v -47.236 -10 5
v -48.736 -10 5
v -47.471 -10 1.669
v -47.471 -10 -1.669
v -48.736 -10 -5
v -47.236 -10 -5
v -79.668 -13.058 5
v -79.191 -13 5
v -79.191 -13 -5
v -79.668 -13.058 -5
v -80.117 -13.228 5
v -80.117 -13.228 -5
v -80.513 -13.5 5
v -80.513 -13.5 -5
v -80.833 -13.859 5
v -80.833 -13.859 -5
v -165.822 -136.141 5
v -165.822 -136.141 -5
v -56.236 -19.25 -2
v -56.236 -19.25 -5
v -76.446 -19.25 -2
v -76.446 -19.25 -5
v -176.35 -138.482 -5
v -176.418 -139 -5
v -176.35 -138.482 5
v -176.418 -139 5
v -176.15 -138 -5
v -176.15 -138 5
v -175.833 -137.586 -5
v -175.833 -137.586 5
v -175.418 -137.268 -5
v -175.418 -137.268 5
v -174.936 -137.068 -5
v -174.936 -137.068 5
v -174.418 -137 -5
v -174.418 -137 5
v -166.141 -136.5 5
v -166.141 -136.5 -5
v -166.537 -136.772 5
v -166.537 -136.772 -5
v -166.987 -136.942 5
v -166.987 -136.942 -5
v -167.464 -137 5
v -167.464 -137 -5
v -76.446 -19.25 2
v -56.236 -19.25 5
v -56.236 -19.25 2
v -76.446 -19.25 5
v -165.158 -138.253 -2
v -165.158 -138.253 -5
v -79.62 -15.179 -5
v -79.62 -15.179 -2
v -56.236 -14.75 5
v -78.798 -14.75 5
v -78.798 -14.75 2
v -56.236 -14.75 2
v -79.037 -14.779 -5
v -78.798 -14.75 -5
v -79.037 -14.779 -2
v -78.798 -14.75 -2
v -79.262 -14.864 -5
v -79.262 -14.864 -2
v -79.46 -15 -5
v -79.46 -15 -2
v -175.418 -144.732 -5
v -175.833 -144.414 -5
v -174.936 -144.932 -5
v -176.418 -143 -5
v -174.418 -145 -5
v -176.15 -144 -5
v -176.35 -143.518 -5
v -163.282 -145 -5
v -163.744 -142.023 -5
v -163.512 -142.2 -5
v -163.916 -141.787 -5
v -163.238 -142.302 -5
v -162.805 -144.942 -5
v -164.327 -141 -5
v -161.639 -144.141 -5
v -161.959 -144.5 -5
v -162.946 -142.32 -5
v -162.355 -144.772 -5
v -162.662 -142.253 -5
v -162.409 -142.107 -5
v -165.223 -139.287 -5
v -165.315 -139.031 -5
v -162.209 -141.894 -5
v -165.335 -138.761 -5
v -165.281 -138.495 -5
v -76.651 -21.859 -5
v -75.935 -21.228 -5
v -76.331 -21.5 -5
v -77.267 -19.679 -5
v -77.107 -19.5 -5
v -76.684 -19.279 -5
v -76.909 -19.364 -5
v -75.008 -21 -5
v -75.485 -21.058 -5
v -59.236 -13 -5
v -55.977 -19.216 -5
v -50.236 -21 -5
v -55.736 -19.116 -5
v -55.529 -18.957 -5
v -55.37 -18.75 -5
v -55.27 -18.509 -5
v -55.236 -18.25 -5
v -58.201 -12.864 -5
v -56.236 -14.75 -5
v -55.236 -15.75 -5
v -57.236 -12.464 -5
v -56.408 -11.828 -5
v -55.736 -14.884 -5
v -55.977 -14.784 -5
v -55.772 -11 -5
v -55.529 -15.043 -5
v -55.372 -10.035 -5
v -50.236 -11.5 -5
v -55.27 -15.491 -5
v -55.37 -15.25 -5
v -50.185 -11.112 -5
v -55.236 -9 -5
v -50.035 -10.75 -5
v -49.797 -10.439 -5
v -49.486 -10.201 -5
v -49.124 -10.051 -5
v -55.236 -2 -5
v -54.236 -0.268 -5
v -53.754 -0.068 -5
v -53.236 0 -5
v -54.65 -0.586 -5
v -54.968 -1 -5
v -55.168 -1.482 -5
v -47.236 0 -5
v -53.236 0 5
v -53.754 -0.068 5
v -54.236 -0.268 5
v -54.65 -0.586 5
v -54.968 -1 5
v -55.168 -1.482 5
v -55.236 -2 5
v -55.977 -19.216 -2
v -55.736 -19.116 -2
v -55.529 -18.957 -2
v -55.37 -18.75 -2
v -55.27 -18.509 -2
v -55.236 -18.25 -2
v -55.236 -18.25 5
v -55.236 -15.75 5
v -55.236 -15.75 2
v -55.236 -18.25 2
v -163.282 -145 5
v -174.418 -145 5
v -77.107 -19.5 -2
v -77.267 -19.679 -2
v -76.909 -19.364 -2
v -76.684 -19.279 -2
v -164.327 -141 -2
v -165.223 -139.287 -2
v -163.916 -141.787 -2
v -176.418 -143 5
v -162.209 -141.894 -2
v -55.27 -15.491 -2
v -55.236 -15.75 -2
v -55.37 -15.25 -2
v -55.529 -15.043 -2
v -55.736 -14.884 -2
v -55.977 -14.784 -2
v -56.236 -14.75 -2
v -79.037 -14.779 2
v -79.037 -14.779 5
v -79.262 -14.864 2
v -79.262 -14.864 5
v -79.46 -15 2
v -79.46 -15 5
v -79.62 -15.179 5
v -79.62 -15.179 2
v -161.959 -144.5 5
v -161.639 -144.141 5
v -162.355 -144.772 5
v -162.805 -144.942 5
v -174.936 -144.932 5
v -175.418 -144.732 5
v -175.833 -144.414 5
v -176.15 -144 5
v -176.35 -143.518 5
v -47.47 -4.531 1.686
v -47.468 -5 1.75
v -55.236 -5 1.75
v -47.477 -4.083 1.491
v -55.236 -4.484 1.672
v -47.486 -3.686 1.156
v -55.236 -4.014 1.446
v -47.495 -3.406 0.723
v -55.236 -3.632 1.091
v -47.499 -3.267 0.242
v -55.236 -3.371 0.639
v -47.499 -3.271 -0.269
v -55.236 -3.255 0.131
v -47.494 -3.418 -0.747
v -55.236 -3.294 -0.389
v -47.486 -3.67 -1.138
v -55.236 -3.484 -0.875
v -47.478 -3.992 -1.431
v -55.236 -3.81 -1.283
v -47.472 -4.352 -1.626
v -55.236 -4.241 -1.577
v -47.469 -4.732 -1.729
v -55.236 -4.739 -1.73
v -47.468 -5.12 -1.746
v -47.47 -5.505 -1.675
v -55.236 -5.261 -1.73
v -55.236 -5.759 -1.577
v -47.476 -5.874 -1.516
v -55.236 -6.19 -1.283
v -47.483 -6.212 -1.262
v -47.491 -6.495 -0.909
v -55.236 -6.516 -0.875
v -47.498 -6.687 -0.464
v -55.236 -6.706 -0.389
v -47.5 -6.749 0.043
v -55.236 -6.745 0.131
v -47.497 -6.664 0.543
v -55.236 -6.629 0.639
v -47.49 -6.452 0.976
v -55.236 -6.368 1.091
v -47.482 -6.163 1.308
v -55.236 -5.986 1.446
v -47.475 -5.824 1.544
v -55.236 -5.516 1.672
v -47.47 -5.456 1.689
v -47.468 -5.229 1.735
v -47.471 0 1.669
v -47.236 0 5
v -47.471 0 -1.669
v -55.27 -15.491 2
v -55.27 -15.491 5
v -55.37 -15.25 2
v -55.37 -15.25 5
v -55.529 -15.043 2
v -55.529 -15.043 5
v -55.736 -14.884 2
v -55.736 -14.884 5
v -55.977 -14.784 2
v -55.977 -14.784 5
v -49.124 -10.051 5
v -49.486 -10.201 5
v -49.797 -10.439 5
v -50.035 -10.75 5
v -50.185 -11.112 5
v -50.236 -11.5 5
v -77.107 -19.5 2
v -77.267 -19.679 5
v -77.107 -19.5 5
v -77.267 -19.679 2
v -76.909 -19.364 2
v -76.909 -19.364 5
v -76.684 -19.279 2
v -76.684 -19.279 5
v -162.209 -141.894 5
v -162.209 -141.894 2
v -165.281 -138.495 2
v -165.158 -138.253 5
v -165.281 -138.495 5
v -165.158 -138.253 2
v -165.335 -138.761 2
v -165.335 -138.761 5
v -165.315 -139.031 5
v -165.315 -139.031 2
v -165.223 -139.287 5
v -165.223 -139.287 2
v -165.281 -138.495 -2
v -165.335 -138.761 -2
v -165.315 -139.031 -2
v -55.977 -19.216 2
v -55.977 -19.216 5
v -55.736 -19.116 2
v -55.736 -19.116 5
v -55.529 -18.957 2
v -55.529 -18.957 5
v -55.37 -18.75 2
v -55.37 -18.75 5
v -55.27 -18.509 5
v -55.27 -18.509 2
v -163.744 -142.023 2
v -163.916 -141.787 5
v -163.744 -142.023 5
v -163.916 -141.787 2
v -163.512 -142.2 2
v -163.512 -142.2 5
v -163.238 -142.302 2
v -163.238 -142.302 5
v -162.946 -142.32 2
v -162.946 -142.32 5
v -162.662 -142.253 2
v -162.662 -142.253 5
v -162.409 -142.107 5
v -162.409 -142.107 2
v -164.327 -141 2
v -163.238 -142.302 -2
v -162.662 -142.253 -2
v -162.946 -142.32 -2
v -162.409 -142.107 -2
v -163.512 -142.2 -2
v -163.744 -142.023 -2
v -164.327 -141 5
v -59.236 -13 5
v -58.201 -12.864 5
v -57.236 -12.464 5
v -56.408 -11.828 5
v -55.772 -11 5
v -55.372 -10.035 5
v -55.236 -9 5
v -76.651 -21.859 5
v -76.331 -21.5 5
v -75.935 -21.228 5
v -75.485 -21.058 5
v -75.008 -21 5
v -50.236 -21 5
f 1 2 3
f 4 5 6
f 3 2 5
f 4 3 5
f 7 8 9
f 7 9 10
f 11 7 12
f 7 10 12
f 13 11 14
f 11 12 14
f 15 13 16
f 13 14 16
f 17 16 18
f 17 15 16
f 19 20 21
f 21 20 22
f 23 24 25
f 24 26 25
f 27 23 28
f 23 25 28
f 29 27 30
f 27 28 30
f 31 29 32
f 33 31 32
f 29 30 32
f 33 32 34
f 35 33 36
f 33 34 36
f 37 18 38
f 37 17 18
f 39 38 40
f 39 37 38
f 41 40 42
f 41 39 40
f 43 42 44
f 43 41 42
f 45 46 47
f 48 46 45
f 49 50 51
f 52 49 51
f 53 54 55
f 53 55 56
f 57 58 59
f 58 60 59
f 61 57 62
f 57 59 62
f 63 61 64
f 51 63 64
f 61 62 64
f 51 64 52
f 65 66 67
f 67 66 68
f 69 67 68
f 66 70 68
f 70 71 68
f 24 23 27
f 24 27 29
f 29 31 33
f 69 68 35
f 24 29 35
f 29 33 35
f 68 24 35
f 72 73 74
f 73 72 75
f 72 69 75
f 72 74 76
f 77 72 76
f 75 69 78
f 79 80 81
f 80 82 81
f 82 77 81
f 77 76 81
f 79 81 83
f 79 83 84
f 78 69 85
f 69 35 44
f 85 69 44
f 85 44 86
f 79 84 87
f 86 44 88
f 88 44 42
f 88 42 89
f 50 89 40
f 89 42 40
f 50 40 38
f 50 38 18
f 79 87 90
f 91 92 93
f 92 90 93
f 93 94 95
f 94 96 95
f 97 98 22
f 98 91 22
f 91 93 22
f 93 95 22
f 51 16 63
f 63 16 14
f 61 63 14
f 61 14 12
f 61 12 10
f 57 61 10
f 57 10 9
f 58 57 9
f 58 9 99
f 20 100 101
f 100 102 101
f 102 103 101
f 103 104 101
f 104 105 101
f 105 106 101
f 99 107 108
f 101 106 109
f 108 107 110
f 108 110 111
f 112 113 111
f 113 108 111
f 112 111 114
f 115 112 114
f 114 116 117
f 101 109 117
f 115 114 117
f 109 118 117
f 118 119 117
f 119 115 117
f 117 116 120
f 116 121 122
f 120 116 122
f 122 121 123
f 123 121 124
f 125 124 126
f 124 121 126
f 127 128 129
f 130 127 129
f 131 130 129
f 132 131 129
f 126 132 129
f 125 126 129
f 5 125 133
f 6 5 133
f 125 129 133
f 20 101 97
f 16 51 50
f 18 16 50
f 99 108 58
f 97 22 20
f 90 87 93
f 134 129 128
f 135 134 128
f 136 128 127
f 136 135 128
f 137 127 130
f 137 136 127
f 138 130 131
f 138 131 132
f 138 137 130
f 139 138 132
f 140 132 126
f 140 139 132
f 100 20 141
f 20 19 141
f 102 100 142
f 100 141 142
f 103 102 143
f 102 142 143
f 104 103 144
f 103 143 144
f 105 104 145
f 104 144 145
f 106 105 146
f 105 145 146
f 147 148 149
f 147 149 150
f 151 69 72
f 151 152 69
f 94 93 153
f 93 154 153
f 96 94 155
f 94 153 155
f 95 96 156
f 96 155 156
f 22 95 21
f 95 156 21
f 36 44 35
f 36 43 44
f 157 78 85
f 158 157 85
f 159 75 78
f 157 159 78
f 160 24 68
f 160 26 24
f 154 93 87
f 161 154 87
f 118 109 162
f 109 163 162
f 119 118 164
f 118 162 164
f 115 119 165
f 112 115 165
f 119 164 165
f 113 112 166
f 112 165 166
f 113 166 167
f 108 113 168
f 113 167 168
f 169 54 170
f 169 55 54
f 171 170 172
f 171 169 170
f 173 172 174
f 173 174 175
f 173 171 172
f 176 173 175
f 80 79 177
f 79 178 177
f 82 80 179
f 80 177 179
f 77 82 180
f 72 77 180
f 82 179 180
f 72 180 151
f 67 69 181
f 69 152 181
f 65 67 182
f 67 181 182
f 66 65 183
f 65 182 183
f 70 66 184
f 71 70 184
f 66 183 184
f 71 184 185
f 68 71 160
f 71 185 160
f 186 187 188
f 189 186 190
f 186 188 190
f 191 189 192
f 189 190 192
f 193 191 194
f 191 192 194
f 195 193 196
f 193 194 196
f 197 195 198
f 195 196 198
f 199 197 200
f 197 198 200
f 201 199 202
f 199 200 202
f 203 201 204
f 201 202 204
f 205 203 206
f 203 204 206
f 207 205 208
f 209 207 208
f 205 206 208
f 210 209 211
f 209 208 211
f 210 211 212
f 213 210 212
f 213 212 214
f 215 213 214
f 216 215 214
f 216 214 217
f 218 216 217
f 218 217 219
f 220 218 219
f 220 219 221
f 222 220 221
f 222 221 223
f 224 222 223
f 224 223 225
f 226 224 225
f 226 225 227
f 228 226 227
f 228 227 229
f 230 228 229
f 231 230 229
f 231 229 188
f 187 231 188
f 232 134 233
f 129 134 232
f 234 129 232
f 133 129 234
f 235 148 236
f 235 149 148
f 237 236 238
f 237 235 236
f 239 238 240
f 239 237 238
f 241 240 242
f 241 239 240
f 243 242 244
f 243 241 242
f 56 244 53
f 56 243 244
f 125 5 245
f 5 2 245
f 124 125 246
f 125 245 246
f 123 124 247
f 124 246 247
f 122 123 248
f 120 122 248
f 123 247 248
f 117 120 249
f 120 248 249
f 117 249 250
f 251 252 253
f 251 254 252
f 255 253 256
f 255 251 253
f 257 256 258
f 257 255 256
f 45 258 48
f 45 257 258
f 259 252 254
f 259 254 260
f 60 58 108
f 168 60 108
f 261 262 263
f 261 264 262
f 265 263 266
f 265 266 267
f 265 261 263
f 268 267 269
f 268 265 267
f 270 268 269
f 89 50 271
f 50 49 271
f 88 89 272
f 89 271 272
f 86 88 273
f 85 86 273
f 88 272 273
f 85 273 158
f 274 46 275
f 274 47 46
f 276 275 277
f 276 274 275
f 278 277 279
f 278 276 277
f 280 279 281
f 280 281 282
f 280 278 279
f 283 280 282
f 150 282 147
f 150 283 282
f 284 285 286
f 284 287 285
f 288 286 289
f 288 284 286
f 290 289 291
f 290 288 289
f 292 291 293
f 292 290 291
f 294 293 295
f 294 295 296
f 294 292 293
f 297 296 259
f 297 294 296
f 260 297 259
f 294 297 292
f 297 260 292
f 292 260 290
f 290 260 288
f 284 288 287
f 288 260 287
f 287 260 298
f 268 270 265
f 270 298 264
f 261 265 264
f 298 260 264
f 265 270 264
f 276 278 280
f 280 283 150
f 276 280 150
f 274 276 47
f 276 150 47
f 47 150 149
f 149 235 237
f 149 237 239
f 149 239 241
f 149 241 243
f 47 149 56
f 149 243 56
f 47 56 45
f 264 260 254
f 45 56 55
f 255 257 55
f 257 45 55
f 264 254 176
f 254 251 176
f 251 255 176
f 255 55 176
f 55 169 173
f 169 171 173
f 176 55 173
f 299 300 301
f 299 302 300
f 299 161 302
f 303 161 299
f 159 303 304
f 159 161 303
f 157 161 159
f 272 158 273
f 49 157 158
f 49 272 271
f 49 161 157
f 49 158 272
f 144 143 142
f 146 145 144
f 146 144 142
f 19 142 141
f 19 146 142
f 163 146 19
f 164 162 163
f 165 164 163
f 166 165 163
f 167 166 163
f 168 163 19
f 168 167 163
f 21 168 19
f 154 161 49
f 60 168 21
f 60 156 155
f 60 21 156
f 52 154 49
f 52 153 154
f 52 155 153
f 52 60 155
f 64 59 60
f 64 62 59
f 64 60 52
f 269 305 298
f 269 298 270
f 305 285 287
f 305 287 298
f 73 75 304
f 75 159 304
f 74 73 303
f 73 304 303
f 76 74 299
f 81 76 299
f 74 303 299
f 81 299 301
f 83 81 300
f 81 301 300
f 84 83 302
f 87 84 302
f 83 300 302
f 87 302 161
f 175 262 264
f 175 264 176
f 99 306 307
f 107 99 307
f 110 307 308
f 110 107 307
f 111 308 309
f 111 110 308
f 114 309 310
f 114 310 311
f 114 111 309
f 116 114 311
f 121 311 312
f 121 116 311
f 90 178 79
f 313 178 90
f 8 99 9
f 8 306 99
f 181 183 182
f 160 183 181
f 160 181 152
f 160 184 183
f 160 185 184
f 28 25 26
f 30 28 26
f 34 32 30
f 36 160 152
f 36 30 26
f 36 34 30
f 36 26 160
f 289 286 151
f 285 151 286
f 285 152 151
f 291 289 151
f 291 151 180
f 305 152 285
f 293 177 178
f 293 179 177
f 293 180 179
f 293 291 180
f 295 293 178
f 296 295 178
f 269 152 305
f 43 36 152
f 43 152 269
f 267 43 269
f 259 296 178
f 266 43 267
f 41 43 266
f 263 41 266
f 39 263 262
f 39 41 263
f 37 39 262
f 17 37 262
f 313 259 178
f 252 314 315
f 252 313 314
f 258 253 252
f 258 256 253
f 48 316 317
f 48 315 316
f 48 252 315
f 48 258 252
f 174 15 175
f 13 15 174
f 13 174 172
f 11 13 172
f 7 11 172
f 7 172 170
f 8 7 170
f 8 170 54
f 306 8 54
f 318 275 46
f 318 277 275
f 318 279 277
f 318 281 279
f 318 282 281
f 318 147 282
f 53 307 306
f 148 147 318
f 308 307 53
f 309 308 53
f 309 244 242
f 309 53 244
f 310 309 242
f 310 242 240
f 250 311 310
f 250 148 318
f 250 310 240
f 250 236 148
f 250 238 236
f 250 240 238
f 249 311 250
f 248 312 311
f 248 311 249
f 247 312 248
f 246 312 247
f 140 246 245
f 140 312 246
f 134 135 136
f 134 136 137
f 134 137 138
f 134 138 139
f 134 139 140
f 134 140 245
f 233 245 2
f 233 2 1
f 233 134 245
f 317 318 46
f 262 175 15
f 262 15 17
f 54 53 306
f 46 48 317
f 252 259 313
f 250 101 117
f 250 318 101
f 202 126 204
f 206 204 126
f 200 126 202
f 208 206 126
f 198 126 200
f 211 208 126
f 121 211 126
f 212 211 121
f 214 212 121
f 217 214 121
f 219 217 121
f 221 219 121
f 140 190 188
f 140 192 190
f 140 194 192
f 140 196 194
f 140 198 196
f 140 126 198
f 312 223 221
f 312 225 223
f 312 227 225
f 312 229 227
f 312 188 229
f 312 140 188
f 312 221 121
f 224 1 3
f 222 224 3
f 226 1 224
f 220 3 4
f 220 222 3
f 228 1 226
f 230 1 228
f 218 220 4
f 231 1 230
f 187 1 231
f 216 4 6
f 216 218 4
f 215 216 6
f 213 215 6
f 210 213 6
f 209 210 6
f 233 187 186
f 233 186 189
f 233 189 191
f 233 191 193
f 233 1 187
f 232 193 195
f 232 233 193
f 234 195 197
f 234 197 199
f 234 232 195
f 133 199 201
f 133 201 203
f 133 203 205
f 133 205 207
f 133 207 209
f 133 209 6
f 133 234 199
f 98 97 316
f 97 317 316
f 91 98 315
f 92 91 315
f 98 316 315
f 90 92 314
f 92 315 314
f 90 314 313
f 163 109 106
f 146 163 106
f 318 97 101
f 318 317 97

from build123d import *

# Parameters (mm, degrees)
BOSS_EXTRUDE1_DEPTH = 10
SKETCH2_R           = 1.75
CUT_EXTRUDE1_DEPTH  = 10
BOSS_EXTRUDE2_DEPTH = 5
CUT_EXTRUDE2_DEPTH  = 3
FILLET1_R           = 4
FILLET2_R           = 1.5
FILLET3_R           = 2
FILLET4_R           = 1


with BuildPart() as part:
    # Sketch1 → Boss-Extrude1 (new body)
    with BuildSketch(Plane(origin=(0, 0, 0), x_dir=(1, 0, 0), z_dir=(0, 1, 0))):
        with BuildLine():
            Line((-47.236109069, 5), (-55.236109069, 5))
            Line((-55.236109069, 5), (-55.236109069, -5))
            Line((-55.236109069, -5), (-47.236109069, -5))
            ThreePointArc((-47.236109069, -5), (-47.5, 0), (-47.236109069, 5))
        make_face()
    extrude(amount=-BOSS_EXTRUDE1_DEPTH)

    # Sketch2 → Cut-Extrude1 (cut)
    with BuildSketch(Plane.ZY.offset(55.236109069)):
        with Locations((0, -5)):
            Circle(SKETCH2_R)
    extrude(amount=-CUT_EXTRUDE1_DEPTH, mode=Mode.SUBTRACT)

    # Sketch3 → Boss-Extrude2 (add, symmetric)
    with BuildSketch(Plane.XY):
        Polygon((-80.236109069, -13), (-166.418406548, -137), (-176.418406548, -137), (-176.418406548, -145), (-162.236109069, -145), (-76.053811591, -21), (-50.236109069, -21), (-50.236109069, -10), (-55.236109069, -10), (-55.236109069, -13), align=None)
    extrude(amount=BOSS_EXTRUDE2_DEPTH, both=True)

    # Sketch4 → Cut-Extrude2 (cut)
    with BuildSketch(Plane.XY.offset(5)):
        Polygon((-164.327257809, -141), (-165.503528974, -138.75), (-79.321231496, -14.75), (-55.236109069, -14.75), (-55.236109069, -19.25), (-76.968689164, -19.25), (-163.150986643, -143.25), align=None)
    cut_extrude2 = extrude(amount=-CUT_EXTRUDE2_DEPTH, mode=Mode.SUBTRACT)

    # Mirror1: Cut-Extrude2 across plane
    add(cut_extrude2.mirror(Plane.XY), mode=Mode.SUBTRACT)

    # Fillet1
    fillet1_edges = [part.edges().sort_by_distance(p)[0] for p in [
        (-55.236109069, -13, 0),
    ]]
    fillet(fillet1_edges, radius=FILLET1_R)

    # Fillet2
    fillet2_edges = [part.edges().sort_by_distance(p)[0] for p in [
        (-50.236109069, -10, 0),
    ]]
    fillet(fillet2_edges, radius=FILLET2_R)

    # Fillet3
    fillet3_edges = [part.edges().sort_by_distance(p)[0] for p in [
        (-80.236109069, -13, 0),
        (-166.418406548, -137, 0),
        (-176.418406548, -137, 0),
        (-176.418406548, -145, 0),
        (-162.236109069, -145, 0),
        (-76.053811591, -21, 0),
        (-55.236109069, 0, 0),
    ]]
    fillet(fillet3_edges, radius=FILLET3_R)

    # Fillet4
    fillet4_edges = [part.edges().sort_by_distance(p)[0] for p in [
        (-55.236109069, -14.75, 3.5),
        (-55.236109069, -19.25, 3.5),
        (-76.968689164, -19.25, 3.5),
        (-163.150986643, -143.25, 3.5),
        (-165.503528974, -138.75, 3.5),
        (-79.321231496, -14.75, 3.5),
        (-55.236109069, -19.25, -3.5),
        (-55.236109069, -14.75, -3.5),
        (-79.321231496, -14.75, -3.5),
        (-165.503528974, -138.75, -3.5),
        (-163.150986643, -143.25, -3.5),
        (-76.968689164, -19.25, -3.5),
    ]]
    fillet(fillet4_edges, radius=FILLET4_R)


solid = part.part
